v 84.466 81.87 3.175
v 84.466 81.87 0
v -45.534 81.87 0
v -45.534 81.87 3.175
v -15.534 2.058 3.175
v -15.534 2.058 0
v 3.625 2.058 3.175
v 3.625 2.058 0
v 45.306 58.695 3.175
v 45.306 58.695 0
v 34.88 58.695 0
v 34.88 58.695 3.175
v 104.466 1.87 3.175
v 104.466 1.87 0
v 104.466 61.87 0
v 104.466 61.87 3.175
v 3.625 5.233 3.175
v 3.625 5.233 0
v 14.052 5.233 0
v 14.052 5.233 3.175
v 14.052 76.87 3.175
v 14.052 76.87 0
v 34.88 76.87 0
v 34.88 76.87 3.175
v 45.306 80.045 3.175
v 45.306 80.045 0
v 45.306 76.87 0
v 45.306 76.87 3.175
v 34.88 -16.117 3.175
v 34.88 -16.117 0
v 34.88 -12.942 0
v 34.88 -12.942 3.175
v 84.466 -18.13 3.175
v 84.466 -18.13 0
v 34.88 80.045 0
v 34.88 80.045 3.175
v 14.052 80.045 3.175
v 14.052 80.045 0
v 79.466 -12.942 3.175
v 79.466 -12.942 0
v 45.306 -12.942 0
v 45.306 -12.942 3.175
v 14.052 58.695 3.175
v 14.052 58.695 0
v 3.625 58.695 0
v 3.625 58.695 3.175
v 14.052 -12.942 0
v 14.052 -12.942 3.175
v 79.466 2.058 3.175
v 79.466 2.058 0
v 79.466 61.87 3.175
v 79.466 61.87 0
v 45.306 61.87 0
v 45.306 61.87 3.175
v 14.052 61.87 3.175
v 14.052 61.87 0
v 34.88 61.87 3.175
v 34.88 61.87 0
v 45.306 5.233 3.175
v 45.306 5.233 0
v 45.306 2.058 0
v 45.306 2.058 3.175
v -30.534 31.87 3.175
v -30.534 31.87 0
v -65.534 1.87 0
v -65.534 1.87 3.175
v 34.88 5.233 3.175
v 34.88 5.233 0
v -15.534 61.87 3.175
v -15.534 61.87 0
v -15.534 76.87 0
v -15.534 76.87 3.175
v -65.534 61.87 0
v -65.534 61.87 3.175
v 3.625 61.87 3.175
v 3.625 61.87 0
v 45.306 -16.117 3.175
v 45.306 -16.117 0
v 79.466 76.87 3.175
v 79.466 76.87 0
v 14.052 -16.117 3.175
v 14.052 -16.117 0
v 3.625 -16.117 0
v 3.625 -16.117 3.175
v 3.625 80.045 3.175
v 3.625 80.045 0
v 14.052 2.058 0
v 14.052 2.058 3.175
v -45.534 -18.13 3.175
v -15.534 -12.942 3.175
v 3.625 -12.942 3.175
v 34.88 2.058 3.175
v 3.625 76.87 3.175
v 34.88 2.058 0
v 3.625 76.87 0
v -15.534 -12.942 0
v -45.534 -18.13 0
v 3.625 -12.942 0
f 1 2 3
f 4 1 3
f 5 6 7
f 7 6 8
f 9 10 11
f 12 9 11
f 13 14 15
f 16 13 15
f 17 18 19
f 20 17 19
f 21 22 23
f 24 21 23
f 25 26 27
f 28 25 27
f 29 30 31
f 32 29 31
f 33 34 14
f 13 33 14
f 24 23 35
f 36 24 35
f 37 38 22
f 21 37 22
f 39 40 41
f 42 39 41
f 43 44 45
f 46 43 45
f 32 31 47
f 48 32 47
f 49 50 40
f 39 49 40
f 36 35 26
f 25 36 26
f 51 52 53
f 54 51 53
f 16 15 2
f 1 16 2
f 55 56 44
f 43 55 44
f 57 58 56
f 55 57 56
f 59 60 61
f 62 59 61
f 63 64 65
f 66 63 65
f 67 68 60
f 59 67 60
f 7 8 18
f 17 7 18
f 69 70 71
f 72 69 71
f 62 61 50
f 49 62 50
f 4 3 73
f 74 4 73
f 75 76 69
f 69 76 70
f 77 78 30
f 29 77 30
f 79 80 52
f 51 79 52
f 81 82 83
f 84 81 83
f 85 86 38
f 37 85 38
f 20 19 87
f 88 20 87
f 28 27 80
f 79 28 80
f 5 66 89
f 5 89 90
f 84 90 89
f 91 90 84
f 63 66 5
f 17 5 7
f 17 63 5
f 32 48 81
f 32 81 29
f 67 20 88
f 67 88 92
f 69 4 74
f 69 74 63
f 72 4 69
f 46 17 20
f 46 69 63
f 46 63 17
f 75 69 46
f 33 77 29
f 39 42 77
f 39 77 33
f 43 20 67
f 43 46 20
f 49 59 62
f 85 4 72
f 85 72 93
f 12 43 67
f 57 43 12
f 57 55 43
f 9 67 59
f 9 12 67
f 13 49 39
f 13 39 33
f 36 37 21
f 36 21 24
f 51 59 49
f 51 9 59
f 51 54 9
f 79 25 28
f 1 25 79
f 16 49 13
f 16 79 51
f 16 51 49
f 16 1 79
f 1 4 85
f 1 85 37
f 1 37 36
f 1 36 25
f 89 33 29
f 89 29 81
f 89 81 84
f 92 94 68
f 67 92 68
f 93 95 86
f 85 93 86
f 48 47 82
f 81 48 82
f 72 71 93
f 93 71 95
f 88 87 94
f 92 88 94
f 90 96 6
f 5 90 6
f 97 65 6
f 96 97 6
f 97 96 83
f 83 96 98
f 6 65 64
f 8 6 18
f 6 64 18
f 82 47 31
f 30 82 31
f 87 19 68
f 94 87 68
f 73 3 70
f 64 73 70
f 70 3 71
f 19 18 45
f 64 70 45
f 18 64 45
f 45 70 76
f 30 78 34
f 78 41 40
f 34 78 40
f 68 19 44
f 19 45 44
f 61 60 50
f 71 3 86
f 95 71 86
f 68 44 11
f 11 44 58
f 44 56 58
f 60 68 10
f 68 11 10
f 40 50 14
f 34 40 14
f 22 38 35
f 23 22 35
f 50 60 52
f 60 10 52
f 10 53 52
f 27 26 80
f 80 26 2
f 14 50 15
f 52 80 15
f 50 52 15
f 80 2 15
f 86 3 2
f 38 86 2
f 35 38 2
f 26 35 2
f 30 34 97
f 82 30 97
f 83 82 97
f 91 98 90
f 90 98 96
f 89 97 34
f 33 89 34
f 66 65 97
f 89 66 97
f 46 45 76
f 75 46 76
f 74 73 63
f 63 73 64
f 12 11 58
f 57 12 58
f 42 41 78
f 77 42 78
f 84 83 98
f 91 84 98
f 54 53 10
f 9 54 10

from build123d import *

# Parameters (mm, degrees)
F1_DEPTH = 3.175


# Not quite as in the source:
# - a length typed as a fraction of an inch, garbled in the dataset ("3 / 203.2 mm" for 3/8 in), is restored


with BuildPart() as f1:
    # F0 (on Top) → F1 (new body)
    with BuildSketch(Plane.XY):
        Polygon((84.4656275958, 81.8700266516), (-45.5343724042, 81.8700266516), (-65.5343724042, 61.8700266516), (-30.5343724042, 31.8700266516), (-65.5343724042, 1.8700266516), (-45.5343724042, -18.1299733484), (84.4656275958, -18.1299733484), (104.4656275958, 1.8700266516), (104.4656275958, 61.8700266516), align=None)
        Polygon((-15.5343724042, -12.9424554378), (-15.5343724042, 2.0575445622), (3.6249275958, 2.0575445622), (3.6249275958, 5.2325445622), (14.0516275958, 5.2325445622), (14.0516275958, 2.0575445622), (34.8796275958, 2.0575445622), (34.8796275958, 5.2325445622), (45.3063275958, 5.2325445622), (45.3063275958, 2.0575445622), (64.4656275958, 2.0575445622), (74.4656275958, 2.0575445622), (79.4656275958, 2.0575445622), (79.4656275958, -12.9424554378), (74.4656275958, -12.9424554378), (64.4656275958, -12.9424554378), (45.3063275958, -12.9424554378), (45.3063275958, -16.1174554378), (34.8796275958, -16.1174554378), (34.8796275958, -12.9424554378), (14.0516275958, -12.9424554378), (14.0516275958, -16.1174554378), (3.6249275958, -16.1174554378), (3.6249275958, -12.9424554378), align=None, mode=Mode.SUBTRACT)
        Polygon((-15.5343724042, 61.8700266516), (-15.5343724042, 76.8700266516), (3.6249275958, 76.8700266516), (3.6249275958, 80.0450266516), (14.0516275958, 80.0450266516), (14.0516275958, 76.8700266516), (34.8796275958, 76.8700266516), (34.8796275958, 80.0450266516), (45.3063275958, 80.0450266516), (45.3063275958, 76.8700266516), (64.4656275958, 76.8700266516), (74.4656275958, 76.8700266516), (79.4656275958, 76.8700266516), (79.4656275958, 61.8700266516), (74.4656275958, 61.8700266516), (64.4656275958, 61.8700266516), (45.3063275958, 61.8700266516), (45.3063275958, 58.6950266516), (34.8796275958, 58.6950266516), (34.8796275958, 61.8700266516), (14.0516275958, 61.8700266516), (14.0516275958, 58.6950266516), (3.6249275958, 58.6950266516), (3.6249275958, 61.8700266516), align=None, mode=Mode.SUBTRACT)
    extrude(amount=F1_DEPTH)


solid = f1.part
